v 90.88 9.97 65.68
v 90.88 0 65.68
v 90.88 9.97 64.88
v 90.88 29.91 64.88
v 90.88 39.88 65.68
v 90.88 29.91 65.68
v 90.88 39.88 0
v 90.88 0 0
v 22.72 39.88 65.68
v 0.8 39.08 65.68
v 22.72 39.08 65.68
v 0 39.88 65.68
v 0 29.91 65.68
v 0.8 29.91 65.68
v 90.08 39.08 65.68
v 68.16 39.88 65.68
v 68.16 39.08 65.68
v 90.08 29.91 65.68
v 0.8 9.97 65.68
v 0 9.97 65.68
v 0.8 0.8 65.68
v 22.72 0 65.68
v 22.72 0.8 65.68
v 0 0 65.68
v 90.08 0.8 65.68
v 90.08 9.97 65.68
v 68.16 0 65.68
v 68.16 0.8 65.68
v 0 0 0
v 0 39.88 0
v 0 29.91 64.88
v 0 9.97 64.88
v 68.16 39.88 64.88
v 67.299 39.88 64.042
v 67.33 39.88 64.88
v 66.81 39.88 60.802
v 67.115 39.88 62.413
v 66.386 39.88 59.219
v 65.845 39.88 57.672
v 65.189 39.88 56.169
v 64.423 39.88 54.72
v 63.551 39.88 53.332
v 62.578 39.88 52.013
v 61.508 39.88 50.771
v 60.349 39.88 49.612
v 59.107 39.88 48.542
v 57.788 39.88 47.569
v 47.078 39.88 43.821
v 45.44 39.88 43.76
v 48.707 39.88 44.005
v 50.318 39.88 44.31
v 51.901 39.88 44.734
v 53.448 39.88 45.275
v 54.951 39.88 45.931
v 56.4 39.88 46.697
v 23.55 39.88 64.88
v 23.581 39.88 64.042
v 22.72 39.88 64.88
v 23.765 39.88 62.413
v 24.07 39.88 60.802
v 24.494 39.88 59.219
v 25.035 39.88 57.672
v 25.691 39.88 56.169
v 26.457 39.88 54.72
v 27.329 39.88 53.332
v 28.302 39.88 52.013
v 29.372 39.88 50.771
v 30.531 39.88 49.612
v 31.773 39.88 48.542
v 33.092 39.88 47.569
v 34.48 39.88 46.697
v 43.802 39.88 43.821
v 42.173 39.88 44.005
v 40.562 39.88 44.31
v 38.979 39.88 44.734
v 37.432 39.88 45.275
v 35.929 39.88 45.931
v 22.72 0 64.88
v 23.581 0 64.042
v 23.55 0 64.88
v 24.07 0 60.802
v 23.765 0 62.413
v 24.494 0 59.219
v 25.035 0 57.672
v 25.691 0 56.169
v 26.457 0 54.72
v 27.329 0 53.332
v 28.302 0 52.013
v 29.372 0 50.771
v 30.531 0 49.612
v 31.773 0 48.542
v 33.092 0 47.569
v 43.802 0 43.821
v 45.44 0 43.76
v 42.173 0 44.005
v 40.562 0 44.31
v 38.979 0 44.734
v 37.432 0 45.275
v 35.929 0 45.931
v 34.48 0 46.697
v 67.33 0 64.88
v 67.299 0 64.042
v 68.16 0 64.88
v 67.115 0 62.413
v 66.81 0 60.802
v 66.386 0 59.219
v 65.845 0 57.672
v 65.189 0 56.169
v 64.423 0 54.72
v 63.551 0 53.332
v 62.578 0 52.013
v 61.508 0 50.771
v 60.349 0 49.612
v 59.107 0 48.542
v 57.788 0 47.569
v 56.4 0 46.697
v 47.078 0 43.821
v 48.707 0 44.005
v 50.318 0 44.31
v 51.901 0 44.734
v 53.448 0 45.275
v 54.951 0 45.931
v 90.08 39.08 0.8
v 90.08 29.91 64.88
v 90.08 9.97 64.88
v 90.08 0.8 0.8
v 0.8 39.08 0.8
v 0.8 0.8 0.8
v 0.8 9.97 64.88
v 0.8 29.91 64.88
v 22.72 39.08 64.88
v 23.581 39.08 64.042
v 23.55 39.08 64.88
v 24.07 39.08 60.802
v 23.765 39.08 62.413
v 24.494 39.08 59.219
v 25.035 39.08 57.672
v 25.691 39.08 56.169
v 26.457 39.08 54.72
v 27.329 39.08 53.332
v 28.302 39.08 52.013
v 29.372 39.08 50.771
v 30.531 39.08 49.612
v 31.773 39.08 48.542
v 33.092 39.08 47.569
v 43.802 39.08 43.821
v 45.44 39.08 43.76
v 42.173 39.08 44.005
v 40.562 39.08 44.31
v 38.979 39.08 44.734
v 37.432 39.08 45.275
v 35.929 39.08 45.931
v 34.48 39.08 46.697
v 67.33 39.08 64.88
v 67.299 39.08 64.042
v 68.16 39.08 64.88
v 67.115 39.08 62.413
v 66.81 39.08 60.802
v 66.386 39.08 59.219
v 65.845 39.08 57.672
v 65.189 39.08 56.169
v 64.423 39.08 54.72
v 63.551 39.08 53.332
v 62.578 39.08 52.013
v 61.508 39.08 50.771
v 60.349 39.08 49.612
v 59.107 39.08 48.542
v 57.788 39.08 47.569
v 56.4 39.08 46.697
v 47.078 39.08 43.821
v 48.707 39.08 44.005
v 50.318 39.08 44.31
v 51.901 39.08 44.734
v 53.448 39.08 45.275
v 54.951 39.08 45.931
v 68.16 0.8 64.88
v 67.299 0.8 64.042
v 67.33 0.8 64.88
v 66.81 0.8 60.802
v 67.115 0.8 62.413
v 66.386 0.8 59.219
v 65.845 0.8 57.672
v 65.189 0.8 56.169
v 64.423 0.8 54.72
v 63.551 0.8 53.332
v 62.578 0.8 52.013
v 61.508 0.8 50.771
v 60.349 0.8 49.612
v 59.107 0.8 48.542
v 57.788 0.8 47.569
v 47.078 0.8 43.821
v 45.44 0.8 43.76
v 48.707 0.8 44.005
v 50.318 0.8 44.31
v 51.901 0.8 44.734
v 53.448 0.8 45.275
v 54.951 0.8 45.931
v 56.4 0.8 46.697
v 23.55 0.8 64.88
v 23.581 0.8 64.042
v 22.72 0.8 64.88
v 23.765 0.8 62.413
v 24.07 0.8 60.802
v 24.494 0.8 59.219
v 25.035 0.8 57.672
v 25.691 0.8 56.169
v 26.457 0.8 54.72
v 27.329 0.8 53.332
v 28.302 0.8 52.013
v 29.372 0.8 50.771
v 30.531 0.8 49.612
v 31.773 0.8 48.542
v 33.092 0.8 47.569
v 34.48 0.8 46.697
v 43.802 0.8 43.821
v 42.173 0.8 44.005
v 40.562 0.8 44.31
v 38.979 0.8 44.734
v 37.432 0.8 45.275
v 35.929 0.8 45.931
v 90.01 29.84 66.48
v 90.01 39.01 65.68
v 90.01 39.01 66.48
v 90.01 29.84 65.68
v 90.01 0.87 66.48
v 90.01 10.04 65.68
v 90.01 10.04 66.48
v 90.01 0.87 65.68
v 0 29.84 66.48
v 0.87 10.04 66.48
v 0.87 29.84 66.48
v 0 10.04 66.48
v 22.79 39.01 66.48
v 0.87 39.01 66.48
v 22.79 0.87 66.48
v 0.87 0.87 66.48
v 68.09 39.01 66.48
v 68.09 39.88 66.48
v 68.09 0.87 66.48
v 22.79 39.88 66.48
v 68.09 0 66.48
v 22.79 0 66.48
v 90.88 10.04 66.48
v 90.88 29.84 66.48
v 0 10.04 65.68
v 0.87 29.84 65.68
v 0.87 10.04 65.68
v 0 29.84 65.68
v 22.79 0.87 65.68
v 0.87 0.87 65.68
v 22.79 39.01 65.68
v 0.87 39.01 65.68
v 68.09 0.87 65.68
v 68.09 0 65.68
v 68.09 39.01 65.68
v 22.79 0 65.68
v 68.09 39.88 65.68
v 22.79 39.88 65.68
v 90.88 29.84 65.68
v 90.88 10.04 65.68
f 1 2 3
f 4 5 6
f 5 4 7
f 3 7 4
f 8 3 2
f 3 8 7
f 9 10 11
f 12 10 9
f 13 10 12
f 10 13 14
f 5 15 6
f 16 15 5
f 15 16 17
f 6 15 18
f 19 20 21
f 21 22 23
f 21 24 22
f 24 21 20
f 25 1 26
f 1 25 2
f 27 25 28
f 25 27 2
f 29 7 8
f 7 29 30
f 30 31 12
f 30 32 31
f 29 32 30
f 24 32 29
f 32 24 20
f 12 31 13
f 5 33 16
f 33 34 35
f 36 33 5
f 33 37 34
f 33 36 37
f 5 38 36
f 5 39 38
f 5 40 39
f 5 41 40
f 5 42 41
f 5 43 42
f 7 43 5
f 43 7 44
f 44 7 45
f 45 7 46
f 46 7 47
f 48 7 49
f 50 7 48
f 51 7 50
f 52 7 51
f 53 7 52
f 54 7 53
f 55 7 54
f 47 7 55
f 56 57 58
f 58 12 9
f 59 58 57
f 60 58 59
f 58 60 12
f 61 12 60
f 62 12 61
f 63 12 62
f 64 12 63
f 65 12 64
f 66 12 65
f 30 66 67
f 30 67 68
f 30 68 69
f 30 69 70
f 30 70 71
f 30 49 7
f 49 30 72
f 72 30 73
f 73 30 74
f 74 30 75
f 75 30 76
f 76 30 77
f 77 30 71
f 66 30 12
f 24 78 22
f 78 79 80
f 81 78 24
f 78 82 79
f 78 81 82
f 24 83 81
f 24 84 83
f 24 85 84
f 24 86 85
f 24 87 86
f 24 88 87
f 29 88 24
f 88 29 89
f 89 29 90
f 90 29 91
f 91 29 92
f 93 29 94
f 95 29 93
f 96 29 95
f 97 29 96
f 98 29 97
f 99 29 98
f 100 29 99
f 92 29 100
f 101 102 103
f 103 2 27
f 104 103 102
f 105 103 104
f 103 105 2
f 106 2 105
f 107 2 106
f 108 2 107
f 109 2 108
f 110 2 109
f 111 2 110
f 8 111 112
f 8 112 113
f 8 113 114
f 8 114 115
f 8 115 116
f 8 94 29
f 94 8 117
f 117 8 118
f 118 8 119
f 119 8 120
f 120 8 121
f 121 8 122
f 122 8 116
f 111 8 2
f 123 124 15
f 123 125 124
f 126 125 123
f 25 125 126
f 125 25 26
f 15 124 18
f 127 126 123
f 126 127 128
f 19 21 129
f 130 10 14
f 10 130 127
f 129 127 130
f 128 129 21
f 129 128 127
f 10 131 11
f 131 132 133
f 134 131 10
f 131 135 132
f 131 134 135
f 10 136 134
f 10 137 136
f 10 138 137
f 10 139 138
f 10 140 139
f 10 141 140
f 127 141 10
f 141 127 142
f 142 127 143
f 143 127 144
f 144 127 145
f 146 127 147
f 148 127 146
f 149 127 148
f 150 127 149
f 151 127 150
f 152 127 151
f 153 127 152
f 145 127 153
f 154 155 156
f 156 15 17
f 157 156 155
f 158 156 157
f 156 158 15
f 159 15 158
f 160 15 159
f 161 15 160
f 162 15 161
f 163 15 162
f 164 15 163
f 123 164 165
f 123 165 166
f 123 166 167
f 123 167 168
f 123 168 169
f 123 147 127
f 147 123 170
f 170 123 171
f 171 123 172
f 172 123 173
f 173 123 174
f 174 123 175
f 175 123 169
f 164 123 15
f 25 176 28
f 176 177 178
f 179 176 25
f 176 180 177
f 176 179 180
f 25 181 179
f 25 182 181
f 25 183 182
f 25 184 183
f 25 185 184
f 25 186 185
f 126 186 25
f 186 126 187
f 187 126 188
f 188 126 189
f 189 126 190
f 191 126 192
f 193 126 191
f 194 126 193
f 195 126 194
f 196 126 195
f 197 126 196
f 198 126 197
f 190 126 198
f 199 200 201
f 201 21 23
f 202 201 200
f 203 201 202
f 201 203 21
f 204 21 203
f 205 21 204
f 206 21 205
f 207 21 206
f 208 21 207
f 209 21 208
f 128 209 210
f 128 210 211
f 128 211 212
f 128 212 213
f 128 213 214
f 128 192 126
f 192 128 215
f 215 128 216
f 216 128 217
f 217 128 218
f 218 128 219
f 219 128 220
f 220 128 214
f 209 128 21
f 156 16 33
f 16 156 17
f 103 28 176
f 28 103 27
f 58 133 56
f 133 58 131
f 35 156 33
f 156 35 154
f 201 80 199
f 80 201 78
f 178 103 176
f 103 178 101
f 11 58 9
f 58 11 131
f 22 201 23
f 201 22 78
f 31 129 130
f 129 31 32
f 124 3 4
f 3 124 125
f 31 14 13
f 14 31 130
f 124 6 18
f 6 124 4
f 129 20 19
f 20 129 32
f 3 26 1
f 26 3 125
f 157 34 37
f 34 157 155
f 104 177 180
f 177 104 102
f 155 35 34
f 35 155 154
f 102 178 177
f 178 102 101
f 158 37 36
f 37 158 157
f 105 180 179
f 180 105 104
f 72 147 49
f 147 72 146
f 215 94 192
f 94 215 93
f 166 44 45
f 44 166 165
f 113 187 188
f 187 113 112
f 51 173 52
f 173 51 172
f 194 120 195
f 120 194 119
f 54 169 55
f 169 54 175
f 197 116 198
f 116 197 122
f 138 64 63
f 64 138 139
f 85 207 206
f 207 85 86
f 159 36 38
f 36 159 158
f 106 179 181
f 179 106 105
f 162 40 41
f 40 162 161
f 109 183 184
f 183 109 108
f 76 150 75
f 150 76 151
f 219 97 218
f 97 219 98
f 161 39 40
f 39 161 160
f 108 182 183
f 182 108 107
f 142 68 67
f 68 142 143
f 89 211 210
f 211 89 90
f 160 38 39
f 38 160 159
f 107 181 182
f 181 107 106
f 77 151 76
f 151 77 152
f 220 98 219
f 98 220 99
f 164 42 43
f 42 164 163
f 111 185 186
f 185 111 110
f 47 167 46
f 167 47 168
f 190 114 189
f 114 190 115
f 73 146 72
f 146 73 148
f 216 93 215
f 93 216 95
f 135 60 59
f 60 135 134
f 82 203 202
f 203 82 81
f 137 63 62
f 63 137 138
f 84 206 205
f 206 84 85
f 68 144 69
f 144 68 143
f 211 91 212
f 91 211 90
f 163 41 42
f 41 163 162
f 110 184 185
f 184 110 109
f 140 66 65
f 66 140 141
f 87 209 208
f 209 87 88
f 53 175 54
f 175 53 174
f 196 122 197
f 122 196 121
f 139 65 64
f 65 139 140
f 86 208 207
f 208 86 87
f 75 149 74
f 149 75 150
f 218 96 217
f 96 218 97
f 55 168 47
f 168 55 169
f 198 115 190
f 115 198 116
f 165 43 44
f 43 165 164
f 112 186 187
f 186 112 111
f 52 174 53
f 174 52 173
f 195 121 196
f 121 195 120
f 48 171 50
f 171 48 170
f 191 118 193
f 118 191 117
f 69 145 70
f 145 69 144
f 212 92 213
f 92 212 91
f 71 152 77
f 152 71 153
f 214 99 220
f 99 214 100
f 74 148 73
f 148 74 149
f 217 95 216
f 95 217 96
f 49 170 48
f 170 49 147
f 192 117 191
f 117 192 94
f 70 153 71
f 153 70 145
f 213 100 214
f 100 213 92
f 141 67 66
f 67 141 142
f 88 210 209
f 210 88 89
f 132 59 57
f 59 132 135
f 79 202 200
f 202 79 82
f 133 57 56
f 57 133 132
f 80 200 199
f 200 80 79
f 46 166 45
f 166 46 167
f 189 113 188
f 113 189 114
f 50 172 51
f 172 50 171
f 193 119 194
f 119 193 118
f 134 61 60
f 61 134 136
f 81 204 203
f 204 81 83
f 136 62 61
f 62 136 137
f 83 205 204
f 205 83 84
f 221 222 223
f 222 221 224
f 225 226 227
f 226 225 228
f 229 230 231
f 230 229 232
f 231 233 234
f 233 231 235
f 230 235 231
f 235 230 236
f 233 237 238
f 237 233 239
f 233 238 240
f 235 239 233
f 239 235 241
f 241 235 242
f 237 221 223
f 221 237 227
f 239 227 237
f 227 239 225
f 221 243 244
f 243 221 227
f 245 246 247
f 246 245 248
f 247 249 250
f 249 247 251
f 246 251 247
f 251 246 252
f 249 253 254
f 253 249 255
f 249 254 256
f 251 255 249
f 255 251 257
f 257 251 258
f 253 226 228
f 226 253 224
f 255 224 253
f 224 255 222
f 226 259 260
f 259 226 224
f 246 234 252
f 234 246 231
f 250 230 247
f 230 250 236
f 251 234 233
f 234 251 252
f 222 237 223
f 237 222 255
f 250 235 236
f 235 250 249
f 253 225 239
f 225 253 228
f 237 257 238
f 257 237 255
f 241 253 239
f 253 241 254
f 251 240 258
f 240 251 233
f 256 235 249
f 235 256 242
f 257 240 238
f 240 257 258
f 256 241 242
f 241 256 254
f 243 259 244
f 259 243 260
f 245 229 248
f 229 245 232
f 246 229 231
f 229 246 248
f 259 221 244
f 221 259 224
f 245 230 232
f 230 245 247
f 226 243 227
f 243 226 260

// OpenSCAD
walls = 2;
layer_width = 0.4;

thickness = walls * layer_width;
clearance = 0.07;
loose_clearance = 0.14;

card_width=63;
card_height=89;
deck_height=38;

outside_box = [
  card_height + loose_clearance * 2 + thickness * 2,
  deck_height + loose_clearance * 2 + thickness * 2,
  card_width + loose_clearance * 2 + thickness * 3
];

module box() {
  inside_box = [
    card_height + loose_clearance * 2,
    deck_height + loose_clearance * 2,
    card_width + loose_clearance * 2 + thickness + 1,
  ];
  
  difference() {
    cube(outside_box);
    translate([thickness, thickness, thickness])
      cube(inside_box);
    translate([outside_box[0] / 4, -1, outside_box[2] - thickness])
      cube([outside_box[0] / 2, outside_box[1] + 2, thickness + 1]);
    translate([-1, outside_box[1] / 4, outside_box[2] - thickness])
      cube([outside_box[0] + 2, outside_box[1] / 2, thickness + 1]);
  translate([outside_box[0] / 2, -1, outside_box[2]])
      rotate([-90, 0, 0])
        cylinder(h = outside_box[1] + 2, d = outside_box[0] / 2 - thickness * 2, $fn = 84);  
  }
}

module box_lid() {
    outside_box_lid = [
      outside_box[0] - thickness * 2 - clearance * 2,
      outside_box[1] - thickness * 2 - clearance * 2,
      thickness
    ];
  
  translate([thickness + clearance, thickness + clearance])
    cube(outside_box_lid);
  
  translate([outside_box[0] / 4 + clearance, 0, outside_box_lid[2] - thickness])
    cube([outside_box[0] / 2 - clearance * 2, outside_box[1], thickness]);
  translate([0, outside_box[1] / 4 + clearance, 0])
      cube([outside_box[0], outside_box[1] / 2 - clearance * 2, thickness]);
}

box();
translate([0, 0, outside_box[2]])
  box_lid();
